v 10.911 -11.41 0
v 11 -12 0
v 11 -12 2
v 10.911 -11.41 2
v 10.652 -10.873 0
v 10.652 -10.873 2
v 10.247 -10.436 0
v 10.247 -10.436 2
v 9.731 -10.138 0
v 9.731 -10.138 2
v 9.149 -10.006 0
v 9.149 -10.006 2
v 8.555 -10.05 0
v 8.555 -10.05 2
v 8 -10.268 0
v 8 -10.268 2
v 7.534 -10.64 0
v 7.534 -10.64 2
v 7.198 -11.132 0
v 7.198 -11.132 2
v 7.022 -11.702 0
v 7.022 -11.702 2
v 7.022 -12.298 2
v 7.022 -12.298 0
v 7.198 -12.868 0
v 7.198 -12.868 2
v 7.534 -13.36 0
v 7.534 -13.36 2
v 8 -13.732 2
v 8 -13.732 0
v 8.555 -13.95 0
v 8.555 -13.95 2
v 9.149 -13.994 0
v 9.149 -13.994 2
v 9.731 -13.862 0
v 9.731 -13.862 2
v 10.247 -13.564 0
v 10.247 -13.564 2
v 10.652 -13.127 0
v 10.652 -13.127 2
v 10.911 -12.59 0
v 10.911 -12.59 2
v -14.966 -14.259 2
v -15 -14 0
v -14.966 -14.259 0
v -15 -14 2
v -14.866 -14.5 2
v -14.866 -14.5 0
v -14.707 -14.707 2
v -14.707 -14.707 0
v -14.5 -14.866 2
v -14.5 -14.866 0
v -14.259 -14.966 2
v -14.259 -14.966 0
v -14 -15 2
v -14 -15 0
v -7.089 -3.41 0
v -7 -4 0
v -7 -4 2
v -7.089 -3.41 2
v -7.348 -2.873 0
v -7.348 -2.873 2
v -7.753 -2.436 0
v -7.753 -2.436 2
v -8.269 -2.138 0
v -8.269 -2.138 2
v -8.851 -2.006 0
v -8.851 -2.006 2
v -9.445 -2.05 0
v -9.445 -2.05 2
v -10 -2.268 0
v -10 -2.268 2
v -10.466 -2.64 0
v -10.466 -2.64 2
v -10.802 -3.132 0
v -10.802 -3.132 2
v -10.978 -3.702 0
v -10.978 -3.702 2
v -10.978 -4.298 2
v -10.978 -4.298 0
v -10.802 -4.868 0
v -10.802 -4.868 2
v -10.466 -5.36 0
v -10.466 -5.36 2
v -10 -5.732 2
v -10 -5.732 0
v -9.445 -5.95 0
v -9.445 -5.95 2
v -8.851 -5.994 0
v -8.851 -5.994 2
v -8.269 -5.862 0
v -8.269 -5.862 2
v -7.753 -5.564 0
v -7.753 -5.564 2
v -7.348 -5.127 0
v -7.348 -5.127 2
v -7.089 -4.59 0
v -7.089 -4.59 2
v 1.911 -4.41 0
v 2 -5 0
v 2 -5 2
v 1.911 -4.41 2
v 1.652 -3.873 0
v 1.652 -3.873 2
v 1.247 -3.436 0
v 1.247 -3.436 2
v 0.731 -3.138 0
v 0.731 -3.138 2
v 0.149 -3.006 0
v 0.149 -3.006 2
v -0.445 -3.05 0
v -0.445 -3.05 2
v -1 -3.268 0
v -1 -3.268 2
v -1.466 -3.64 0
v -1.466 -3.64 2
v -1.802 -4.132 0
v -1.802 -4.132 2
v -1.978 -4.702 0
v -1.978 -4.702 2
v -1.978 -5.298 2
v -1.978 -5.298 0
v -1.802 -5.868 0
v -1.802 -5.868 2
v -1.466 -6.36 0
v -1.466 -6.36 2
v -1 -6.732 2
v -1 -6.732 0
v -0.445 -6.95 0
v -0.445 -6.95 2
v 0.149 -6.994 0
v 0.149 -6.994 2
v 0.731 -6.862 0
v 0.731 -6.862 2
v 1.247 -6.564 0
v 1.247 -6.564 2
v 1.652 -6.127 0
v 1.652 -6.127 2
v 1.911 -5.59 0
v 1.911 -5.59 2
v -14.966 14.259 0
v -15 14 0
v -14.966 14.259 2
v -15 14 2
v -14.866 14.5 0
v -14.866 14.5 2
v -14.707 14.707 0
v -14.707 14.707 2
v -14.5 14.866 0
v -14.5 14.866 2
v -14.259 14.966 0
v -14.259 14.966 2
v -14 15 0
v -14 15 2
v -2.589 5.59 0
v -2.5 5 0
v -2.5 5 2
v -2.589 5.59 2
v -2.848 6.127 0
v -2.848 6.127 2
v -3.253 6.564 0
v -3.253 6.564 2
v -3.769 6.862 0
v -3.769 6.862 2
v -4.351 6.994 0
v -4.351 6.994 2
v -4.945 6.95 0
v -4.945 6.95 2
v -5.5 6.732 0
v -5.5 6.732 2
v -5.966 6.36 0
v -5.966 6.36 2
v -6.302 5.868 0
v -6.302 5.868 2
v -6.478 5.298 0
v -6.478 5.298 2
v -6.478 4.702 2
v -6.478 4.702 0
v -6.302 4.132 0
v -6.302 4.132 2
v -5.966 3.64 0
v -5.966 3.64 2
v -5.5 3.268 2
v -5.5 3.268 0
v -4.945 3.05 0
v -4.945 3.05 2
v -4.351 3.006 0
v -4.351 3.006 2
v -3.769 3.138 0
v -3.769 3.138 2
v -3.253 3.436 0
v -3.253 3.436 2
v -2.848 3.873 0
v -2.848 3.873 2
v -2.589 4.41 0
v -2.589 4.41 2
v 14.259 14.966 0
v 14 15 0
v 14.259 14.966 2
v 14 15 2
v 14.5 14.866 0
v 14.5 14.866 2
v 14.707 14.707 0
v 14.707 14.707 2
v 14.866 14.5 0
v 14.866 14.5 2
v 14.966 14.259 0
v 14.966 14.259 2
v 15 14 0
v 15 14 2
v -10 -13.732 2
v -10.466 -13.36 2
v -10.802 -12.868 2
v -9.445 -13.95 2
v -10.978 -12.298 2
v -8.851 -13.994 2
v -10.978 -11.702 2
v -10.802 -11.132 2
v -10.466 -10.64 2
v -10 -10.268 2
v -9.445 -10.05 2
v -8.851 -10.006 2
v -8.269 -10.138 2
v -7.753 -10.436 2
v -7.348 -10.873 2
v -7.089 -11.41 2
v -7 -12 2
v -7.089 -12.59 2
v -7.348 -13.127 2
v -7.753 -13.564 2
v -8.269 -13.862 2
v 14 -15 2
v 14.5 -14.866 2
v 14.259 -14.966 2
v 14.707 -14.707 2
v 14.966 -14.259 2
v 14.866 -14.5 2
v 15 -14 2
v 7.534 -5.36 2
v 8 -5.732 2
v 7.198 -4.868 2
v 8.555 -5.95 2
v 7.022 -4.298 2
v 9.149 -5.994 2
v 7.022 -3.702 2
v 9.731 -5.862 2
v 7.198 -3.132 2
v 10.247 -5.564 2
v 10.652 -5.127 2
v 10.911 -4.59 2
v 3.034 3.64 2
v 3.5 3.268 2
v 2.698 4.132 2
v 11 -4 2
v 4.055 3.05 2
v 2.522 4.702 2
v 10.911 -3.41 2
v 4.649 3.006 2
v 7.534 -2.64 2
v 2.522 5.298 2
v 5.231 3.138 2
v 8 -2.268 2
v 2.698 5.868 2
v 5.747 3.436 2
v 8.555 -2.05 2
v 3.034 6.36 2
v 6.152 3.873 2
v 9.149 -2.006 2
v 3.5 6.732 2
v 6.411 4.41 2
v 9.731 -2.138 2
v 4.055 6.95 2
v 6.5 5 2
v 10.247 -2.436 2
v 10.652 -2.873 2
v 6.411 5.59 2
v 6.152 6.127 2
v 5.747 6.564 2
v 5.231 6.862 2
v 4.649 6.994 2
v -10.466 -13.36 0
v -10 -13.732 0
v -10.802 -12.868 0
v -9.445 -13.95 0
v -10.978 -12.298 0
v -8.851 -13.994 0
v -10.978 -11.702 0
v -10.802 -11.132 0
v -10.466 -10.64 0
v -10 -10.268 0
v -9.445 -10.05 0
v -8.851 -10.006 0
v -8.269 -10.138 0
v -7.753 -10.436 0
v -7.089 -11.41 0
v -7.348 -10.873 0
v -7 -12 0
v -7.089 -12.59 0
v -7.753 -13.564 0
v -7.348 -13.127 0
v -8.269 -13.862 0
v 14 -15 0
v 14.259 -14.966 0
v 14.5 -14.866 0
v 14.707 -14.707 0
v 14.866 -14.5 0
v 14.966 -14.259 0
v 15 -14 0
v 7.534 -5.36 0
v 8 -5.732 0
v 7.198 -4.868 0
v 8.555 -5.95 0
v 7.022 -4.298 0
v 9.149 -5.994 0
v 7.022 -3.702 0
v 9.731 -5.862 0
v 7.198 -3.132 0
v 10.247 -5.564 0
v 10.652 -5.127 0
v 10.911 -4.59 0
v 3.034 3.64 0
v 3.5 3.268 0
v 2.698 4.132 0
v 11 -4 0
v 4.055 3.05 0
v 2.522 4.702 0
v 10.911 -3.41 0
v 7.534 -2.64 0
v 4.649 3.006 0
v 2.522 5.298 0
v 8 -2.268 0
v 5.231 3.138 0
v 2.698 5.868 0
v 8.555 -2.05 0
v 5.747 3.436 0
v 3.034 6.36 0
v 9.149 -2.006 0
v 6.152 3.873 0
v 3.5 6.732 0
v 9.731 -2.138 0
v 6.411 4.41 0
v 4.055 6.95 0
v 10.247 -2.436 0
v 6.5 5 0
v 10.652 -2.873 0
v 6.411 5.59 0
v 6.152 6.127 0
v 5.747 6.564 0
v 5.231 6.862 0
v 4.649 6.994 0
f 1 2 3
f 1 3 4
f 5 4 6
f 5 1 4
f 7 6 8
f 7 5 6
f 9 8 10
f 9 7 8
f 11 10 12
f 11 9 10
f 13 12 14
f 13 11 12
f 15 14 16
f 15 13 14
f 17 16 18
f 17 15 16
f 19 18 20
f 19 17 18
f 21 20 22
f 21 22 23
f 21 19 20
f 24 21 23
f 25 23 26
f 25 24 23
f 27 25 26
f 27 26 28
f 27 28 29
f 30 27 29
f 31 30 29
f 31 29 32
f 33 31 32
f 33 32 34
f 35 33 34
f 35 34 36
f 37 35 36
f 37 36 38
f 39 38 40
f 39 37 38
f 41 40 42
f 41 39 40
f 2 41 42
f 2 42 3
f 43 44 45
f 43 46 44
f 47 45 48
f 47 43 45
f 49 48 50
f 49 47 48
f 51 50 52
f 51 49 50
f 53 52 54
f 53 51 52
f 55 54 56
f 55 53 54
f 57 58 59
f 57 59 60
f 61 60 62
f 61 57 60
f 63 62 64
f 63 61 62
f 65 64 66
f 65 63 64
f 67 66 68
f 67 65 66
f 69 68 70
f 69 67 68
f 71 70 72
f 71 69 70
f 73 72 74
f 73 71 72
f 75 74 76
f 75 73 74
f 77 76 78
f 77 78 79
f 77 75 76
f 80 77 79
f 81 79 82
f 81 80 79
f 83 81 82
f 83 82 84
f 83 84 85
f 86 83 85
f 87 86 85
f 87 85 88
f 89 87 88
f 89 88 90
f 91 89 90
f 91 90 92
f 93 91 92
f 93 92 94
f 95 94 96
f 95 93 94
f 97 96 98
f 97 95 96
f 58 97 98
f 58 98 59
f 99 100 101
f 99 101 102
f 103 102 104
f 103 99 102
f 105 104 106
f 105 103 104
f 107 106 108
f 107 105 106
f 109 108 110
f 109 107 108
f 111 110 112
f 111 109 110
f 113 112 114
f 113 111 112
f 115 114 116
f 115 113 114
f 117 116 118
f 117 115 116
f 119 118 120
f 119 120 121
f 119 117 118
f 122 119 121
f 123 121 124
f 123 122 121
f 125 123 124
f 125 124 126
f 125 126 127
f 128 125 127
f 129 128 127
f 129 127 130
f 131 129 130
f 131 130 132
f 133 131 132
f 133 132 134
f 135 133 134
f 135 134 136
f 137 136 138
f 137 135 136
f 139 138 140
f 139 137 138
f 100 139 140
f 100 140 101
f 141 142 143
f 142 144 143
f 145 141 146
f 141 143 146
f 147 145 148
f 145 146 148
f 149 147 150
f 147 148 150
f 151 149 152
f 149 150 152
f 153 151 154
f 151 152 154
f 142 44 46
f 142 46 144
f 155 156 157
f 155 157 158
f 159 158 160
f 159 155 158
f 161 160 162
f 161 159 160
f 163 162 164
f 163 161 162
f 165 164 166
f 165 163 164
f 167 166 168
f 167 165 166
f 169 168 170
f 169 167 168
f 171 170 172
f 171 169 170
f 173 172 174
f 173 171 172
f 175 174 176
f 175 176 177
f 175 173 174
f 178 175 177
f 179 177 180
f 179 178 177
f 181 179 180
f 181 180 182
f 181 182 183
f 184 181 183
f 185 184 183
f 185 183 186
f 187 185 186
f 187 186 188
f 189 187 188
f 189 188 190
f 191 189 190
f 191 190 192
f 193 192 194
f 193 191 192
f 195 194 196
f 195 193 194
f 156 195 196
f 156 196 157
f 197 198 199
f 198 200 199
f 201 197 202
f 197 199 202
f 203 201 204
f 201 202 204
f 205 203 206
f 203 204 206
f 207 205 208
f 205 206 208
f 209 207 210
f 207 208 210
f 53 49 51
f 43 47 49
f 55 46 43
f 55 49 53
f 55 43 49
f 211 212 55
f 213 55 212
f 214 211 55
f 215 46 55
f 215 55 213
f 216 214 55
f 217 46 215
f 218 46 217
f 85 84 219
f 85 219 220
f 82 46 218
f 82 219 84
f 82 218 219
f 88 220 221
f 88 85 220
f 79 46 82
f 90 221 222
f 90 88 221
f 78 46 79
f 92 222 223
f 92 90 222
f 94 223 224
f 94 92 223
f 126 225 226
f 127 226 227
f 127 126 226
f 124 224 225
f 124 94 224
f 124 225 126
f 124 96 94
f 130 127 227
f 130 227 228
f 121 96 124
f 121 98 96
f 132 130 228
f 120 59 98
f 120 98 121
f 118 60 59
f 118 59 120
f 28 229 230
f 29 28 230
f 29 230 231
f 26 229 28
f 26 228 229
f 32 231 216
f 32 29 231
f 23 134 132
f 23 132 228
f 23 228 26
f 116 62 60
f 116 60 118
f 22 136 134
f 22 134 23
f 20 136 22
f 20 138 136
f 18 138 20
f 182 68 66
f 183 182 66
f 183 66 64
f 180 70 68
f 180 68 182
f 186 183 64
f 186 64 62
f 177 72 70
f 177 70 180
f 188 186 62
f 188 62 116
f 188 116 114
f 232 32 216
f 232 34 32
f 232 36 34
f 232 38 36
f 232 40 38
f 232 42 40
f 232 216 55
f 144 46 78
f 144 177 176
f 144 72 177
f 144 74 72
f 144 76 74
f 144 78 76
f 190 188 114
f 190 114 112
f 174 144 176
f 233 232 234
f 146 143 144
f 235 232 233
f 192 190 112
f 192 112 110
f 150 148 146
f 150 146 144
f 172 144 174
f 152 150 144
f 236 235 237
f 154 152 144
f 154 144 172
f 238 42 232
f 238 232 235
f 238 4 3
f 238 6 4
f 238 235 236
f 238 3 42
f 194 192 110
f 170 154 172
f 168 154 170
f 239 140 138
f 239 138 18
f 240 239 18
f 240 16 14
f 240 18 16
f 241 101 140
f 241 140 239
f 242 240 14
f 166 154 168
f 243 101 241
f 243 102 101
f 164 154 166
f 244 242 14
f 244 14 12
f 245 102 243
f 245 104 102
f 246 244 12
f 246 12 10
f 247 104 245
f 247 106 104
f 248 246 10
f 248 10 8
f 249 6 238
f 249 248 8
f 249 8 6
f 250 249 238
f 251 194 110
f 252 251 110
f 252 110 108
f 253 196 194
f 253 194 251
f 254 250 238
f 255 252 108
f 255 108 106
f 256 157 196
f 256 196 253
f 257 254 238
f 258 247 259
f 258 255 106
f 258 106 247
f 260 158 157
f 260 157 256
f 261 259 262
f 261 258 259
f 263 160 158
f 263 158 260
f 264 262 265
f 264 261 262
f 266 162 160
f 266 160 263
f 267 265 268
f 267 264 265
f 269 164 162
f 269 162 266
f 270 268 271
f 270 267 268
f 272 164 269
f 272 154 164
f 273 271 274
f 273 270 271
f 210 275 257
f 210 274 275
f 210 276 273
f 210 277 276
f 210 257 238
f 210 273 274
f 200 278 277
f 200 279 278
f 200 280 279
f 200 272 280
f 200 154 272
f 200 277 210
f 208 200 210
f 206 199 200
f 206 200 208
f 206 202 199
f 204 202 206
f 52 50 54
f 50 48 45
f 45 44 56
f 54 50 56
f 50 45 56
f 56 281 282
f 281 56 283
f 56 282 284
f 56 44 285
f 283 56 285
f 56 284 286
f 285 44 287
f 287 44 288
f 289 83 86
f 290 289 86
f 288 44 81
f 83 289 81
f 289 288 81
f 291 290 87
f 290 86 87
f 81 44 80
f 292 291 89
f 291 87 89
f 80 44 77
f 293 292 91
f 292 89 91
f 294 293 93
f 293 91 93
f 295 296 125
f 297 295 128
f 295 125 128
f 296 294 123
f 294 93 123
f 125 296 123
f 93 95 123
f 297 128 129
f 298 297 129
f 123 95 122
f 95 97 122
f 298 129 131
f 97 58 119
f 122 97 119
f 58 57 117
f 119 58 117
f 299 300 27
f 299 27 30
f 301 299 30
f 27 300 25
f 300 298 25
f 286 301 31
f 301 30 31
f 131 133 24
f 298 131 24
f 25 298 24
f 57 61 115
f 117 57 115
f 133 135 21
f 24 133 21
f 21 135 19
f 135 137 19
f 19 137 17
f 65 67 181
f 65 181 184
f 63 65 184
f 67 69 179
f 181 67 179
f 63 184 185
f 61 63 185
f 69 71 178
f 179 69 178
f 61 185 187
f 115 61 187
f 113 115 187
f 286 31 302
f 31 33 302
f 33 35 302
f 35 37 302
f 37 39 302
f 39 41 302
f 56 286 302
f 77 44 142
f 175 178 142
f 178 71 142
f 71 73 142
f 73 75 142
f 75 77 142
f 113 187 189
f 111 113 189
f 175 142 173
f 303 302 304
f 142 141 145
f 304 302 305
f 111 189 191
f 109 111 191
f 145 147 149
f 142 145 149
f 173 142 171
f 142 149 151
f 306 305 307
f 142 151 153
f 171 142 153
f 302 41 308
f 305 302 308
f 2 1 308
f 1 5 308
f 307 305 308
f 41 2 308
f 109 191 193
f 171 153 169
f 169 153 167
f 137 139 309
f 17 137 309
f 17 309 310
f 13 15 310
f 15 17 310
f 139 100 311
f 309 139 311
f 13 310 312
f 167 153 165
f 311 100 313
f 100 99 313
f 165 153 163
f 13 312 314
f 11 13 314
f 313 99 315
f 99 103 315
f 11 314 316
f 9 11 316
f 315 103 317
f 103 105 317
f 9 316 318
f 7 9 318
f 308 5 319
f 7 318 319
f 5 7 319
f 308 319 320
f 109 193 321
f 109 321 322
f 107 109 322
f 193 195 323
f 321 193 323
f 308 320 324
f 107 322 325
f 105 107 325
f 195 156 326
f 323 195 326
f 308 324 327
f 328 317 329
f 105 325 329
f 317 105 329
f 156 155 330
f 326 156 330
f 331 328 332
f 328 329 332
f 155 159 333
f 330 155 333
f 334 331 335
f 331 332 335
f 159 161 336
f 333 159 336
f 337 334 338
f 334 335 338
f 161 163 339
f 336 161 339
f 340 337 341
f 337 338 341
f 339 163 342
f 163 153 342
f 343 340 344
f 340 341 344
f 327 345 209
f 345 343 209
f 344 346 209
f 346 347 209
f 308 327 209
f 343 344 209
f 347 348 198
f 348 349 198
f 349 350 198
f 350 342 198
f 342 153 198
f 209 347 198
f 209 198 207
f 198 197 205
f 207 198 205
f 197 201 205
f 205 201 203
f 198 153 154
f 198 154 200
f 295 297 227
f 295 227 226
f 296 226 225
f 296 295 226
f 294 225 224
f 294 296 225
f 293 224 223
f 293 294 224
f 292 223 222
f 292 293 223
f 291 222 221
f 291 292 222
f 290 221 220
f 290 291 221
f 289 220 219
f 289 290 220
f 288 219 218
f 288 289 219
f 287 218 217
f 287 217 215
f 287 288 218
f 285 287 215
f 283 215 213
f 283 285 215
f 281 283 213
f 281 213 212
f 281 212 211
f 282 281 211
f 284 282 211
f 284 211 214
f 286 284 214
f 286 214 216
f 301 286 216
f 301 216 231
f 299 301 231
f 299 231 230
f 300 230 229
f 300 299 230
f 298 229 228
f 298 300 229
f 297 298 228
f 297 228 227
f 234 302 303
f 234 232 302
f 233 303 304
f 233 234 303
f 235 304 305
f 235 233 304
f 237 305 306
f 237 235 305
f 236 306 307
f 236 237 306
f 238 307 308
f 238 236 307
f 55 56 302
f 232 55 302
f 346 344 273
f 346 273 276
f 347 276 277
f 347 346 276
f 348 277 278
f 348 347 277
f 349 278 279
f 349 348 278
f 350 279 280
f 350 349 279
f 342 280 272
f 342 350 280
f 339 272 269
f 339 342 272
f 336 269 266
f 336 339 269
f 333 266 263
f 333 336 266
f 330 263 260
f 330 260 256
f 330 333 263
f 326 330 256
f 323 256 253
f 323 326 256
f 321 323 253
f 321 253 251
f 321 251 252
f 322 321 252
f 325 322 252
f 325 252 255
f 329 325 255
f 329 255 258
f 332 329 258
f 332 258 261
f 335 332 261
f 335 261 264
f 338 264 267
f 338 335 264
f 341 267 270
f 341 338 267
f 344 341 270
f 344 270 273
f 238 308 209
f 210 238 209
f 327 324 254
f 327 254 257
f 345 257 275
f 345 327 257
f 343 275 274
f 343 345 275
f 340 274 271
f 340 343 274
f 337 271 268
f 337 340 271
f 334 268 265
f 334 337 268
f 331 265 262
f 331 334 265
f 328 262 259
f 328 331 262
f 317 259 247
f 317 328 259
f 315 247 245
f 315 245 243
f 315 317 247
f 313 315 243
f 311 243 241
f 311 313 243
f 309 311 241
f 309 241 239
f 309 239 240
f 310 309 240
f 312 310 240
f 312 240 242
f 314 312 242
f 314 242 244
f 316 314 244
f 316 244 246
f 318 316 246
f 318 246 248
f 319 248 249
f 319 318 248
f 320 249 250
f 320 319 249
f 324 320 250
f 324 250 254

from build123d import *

# Parameters (mm, degrees)
SKETCH_W  = 30
SKETCH_H  = 30
SKETCH_R  = 2
PAD_DEPTH = 2
FILLET_R  = 1


with BuildPart() as part:
    # Sketch → Pad (new body)
    with BuildSketch(Plane.XY):
        Rectangle(SKETCH_W, SKETCH_H)
        with Locations((-9, -12)):
            Circle(SKETCH_R, mode=Mode.SUBTRACT)
        with Locations((-9, -4)):
            Circle(SKETCH_R, mode=Mode.SUBTRACT)
        with Locations((9, -4)):
            Circle(SKETCH_R, mode=Mode.SUBTRACT)
        with Locations((9, -12)):
            Circle(SKETCH_R, mode=Mode.SUBTRACT)
        with Locations((0, -5)):
            Circle(SKETCH_R, mode=Mode.SUBTRACT)
        with Locations((4.5, 5)):
            Circle(SKETCH_R, mode=Mode.SUBTRACT)
        with Locations((-4.5, 5)):
            Circle(SKETCH_R, mode=Mode.SUBTRACT)
    extrude(amount=PAD_DEPTH)

    # Fillet
    fillet_edges = [part.edges().sort_by_distance(p)[0] for p in [
        (-15, -15, 1),
        (15, -15, 1),
        (-15, 15, 1),
        (15, 15, 1),
    ]]
    fillet(fillet_edges, radius=FILLET_R)


solid = part.part
